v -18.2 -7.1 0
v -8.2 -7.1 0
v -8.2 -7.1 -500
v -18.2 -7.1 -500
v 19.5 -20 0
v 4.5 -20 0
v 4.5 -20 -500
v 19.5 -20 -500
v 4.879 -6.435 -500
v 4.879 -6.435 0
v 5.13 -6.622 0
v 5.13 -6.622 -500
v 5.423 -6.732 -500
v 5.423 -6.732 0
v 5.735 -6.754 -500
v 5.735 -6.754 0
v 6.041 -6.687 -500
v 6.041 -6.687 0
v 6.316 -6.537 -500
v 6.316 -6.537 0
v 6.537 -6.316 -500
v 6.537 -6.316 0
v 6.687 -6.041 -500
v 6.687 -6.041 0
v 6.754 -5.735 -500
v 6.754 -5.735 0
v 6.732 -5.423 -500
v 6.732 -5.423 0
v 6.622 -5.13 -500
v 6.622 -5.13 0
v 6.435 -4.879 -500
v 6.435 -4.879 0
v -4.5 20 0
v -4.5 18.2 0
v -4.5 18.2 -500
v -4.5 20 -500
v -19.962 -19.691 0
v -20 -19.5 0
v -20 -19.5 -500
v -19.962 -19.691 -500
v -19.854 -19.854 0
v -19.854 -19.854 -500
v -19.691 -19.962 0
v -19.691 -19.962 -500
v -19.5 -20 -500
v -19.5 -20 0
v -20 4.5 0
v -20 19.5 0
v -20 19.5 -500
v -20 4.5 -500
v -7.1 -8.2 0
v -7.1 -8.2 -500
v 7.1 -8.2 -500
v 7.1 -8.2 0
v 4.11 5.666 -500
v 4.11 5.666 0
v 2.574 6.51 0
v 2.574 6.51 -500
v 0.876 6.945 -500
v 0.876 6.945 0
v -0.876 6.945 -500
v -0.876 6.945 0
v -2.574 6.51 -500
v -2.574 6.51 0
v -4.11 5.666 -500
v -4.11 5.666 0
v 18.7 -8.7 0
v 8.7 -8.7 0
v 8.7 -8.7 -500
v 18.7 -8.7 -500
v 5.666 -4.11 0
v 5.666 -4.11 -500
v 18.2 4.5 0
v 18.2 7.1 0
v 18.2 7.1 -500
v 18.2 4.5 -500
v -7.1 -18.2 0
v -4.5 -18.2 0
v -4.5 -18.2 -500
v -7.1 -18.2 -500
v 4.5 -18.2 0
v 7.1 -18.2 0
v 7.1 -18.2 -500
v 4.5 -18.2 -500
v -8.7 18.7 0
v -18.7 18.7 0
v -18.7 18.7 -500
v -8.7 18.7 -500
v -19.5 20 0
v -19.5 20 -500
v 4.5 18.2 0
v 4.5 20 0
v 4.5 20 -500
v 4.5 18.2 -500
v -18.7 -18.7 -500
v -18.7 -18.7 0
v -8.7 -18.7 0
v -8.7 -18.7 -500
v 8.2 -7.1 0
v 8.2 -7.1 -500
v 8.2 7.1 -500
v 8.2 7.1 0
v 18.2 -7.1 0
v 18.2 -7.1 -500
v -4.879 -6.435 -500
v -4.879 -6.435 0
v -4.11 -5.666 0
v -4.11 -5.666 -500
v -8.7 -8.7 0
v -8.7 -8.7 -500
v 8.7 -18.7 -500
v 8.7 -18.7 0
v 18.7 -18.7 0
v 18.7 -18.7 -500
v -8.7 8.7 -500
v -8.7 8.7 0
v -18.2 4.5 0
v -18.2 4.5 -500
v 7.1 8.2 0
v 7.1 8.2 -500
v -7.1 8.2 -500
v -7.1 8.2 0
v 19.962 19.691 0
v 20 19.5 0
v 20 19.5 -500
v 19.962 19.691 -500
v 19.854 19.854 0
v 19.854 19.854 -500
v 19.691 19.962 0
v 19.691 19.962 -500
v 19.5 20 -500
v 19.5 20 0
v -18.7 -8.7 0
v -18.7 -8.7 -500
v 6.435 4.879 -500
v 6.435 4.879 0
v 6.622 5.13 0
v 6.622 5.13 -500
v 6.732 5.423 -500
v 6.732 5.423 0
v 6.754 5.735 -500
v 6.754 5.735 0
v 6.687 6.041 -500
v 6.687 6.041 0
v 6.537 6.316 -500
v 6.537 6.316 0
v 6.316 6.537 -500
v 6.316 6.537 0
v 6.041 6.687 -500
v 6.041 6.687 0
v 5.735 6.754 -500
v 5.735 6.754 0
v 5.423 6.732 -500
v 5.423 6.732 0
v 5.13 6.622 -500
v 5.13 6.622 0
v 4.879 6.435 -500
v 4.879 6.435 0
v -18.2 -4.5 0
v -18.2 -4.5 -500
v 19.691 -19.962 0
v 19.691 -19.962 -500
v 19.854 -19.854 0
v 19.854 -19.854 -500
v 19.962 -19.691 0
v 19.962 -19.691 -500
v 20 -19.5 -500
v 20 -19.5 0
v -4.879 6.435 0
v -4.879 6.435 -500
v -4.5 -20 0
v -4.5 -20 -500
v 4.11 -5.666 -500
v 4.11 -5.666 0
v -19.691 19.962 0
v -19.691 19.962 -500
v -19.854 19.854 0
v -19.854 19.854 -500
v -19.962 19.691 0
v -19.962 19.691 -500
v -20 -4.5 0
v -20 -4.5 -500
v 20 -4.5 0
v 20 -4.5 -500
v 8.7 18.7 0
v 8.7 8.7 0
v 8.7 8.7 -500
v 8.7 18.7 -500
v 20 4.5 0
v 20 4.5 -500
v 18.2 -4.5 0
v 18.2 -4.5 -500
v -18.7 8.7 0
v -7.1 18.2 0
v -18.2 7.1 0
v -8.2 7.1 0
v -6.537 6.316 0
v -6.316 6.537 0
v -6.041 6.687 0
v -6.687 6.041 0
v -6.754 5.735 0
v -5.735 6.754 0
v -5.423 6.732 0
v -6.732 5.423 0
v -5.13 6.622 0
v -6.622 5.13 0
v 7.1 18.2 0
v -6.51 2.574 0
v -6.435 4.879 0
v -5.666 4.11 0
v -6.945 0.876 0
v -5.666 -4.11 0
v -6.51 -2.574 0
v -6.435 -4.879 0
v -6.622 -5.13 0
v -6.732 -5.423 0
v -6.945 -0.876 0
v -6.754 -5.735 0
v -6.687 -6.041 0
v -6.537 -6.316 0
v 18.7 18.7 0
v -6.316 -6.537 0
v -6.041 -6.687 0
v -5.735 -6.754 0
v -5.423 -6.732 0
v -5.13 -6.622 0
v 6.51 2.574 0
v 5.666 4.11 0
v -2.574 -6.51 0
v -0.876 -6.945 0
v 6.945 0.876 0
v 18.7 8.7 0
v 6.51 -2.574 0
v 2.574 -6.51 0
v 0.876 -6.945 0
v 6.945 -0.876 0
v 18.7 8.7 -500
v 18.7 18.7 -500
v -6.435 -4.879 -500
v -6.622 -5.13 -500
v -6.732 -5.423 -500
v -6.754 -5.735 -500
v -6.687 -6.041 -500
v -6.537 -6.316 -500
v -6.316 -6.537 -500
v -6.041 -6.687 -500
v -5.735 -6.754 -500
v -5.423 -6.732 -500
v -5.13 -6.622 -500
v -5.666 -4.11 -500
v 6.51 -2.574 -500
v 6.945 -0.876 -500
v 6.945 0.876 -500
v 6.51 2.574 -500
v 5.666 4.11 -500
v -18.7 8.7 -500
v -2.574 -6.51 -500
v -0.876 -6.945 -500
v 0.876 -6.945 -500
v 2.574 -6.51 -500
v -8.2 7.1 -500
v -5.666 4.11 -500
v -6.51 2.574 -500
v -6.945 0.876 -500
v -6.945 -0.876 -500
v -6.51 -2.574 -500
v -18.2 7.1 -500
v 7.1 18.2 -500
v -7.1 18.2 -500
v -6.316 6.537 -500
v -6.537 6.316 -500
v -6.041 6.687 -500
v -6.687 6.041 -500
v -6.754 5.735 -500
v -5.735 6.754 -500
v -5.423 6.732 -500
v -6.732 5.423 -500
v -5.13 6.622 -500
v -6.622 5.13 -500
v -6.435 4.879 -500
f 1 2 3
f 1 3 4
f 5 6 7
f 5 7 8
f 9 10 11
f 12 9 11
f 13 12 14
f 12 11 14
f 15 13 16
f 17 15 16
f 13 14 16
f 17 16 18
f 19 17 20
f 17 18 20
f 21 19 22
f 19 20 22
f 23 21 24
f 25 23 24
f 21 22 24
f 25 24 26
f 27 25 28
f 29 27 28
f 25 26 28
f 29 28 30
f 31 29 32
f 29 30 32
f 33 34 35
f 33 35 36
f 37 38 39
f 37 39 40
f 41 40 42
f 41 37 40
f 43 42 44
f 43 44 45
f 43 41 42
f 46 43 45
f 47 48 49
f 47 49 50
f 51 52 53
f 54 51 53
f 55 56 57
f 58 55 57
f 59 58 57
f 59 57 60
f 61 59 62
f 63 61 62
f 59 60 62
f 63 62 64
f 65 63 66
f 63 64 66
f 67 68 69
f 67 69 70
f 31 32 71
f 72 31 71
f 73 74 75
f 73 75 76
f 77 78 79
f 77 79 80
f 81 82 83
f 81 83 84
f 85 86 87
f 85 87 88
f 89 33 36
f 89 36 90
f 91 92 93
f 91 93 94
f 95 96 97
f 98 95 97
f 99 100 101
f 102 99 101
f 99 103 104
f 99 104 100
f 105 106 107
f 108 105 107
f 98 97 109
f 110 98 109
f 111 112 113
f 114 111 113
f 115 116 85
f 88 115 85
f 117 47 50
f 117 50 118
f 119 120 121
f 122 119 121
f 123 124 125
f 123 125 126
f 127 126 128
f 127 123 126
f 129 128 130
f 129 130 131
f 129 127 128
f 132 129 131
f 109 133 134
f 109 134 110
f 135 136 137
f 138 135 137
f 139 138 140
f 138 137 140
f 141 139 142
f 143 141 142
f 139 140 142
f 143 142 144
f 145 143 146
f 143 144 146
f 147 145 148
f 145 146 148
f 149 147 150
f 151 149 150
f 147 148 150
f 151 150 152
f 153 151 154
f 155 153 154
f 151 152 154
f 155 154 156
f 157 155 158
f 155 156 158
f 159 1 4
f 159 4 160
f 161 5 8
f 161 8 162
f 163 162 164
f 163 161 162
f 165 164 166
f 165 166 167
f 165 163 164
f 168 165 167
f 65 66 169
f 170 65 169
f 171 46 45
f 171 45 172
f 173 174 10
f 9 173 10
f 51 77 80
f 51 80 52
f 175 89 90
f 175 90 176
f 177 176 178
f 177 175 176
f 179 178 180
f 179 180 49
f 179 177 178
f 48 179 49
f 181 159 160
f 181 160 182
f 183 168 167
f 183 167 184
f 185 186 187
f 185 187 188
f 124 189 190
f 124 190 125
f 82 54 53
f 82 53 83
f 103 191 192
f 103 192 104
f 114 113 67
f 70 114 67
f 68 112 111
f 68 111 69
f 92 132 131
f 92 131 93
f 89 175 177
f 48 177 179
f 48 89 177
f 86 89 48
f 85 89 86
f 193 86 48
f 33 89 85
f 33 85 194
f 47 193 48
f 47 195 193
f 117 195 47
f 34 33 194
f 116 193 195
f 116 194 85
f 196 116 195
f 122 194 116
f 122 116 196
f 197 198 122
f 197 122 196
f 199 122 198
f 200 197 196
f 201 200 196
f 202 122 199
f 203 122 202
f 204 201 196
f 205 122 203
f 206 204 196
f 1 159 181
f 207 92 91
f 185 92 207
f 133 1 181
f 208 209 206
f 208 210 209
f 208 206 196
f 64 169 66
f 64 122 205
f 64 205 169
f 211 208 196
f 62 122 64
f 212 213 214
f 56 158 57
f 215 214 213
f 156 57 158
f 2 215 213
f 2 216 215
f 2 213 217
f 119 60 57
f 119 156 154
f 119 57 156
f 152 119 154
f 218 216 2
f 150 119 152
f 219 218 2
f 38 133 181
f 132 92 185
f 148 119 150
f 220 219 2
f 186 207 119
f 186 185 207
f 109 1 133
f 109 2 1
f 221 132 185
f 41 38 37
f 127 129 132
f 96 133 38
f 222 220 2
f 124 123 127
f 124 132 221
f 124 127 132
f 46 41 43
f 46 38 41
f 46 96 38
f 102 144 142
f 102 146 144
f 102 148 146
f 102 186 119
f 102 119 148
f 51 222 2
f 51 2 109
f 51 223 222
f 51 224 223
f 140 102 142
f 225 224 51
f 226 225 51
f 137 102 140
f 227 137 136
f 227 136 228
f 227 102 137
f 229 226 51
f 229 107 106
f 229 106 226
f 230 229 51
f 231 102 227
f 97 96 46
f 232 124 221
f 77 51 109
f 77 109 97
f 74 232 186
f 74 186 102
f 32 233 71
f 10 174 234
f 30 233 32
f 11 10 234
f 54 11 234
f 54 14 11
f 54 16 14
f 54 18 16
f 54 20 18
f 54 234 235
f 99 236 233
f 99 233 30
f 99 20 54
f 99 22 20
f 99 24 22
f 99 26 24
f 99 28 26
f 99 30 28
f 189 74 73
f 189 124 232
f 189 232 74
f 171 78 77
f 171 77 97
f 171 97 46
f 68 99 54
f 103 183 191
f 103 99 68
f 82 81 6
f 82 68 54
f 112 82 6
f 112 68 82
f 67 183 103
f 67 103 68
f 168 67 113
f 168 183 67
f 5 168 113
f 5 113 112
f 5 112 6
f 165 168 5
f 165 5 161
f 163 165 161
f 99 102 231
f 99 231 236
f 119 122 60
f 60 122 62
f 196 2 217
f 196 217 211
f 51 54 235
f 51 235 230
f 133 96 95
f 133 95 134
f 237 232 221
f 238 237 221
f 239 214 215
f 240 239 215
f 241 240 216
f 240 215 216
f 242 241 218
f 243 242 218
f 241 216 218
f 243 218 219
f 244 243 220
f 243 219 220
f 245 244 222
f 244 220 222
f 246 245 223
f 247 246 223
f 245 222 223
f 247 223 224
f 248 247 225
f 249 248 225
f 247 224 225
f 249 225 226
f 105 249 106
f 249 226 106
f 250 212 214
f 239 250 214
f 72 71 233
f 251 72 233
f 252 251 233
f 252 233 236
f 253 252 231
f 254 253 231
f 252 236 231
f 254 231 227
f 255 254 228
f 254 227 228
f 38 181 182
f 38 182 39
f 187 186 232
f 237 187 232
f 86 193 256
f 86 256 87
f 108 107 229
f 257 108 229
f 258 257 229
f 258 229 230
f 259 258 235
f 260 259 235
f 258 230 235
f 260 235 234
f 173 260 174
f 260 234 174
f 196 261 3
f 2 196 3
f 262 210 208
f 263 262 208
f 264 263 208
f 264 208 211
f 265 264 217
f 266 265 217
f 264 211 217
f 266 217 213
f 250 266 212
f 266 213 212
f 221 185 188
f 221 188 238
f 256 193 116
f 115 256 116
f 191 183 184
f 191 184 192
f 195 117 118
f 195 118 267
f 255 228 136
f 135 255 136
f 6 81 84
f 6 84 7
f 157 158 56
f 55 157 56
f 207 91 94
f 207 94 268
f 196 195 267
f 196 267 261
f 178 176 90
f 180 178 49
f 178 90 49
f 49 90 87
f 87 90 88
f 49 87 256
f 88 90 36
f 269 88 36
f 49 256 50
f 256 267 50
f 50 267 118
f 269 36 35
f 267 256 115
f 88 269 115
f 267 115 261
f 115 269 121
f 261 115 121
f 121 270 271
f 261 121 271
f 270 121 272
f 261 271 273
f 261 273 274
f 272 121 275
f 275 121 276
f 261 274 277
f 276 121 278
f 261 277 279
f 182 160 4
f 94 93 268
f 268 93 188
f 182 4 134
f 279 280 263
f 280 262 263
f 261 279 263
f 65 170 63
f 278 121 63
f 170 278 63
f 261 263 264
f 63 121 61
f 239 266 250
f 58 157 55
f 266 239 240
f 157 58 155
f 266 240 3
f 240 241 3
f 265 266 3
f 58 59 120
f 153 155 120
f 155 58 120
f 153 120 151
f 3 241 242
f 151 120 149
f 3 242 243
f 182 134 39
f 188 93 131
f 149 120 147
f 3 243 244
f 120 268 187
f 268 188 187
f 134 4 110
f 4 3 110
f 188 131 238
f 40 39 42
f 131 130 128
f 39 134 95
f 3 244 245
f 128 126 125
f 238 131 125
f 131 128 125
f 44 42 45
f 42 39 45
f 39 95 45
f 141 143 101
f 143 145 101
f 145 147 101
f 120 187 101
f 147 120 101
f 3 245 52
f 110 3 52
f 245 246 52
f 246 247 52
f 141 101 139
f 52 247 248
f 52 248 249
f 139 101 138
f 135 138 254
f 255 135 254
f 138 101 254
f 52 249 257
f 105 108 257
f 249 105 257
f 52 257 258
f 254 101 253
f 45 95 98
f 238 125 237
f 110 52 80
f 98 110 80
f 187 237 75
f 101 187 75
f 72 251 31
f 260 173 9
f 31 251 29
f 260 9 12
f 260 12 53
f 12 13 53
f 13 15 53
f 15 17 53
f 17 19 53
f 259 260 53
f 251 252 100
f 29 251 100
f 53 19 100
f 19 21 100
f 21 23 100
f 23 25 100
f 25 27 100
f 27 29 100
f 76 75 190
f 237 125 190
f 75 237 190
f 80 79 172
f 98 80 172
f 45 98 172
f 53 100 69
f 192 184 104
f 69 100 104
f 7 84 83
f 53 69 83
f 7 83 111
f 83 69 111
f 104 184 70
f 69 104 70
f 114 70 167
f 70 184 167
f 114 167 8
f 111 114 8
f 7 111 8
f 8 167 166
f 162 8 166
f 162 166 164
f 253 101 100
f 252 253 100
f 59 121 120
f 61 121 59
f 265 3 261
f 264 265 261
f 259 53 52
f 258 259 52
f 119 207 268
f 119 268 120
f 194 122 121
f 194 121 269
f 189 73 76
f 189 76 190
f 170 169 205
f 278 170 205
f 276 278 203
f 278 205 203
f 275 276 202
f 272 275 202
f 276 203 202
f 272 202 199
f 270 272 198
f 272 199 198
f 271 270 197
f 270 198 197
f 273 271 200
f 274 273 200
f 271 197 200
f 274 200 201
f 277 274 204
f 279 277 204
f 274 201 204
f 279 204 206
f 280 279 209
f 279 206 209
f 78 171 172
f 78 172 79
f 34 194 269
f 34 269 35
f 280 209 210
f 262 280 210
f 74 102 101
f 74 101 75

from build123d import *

# Parameters (mm, degrees)
SKETCH114_W               = 10
SKETCH114_H               = 10
F_40_X_40A_X_R0_5_1_DEPTH = 500


with BuildPart() as part:
    # Sketch114 → 铝型材 40 X 40A X R0.5(1) (new body)
    with BuildSketch(Plane.YX):
        with BuildLine():
            Line((-19.5, 20), (-4.5, 20))
            Line((-4.5, 20), (-4.5, 18.2))
            Line((-4.5, 18.2), (-7.1, 18.2))
            Line((-7.1, 18.2), (-7.1, 8.2))
            Line((-7.1, 8.2), (7.1, 8.2))
            Line((7.1, 8.2), (7.1, 18.2))
            Line((7.1, 18.2), (4.5, 18.2))
            Line((4.5, 18.2), (4.5, 20))
            Line((4.5, 20), (19.5, 20))
            ThreePointArc((19.5, 20), (19.853553391, 19.853553391), (20, 19.5))
            Line((20, 19.5), (20, 4.5))
            Line((20, 4.5), (18.2, 4.5))
            Line((18.2, 4.5), (18.2, 7.1))
            Line((18.2, 7.1), (8.2, 7.1))
            Line((8.2, 7.1), (8.2, -7.1))
            Line((8.2, -7.1), (18.2, -7.1))
            Line((18.2, -7.1), (18.2, -4.5))
            Line((18.2, -4.5), (20, -4.5))
            Line((20, -4.5), (20, -19.5))
            ThreePointArc((20, -19.5), (19.853553391, -19.853553391), (19.5, -20))
            Line((19.5, -20), (4.5, -20))
            Line((4.5, -20), (4.5, -18.2))
            Line((4.5, -18.2), (7.1, -18.2))
            Line((7.1, -18.2), (7.1, -8.2))
            Line((7.1, -8.2), (-7.1, -8.2))
            Line((-7.1, -8.2), (-7.1, -18.2))
            Line((-7.1, -18.2), (-4.5, -18.2))
            Line((-4.5, -18.2), (-4.5, -20))
            Line((-4.5, -20), (-19.5, -20))
            ThreePointArc((-19.5, -20), (-19.853553391, -19.853553391), (-20, -19.5))
            Line((-20, -19.5), (-20, -4.5))
            Line((-20, -4.5), (-18.2, -4.5))
            Line((-18.2, -4.5), (-18.2, -7.1))
            Line((-18.2, -7.1), (-8.2, -7.1))
            Line((-8.2, -7.1), (-8.2, 7.1))
            Line((-8.2, 7.1), (-18.2, 7.1))
            Line((-18.2, 7.1), (-18.2, 4.5))
            Line((-18.2, 4.5), (-20, 4.5))
            Line((-20, 4.5), (-20, 19.5))
            ThreePointArc((-20, 19.5), (-19.853553391, 19.853553391), (-19.5, 20))
        make_face()
        with BuildLine():
            Line((-4.87903679, 6.434671709), (-4.110433762, 5.66606868))
            ThreePointArc((-4.110433762, 5.66606868), (0, 7), (4.110433762, 5.66606868))
            Line((4.110433762, 5.66606868), (4.87903679, 6.434671709))
            ThreePointArc((4.87903679, 6.434671709), (6.434671709, 6.434671709), (6.434671709, 4.87903679))
            Line((6.434671709, 4.87903679), (5.66606868, 4.110433762))
            ThreePointArc((5.66606868, 4.110433762), (7, 0), (5.66606868, -4.110433762))
            Line((5.66606868, -4.110433762), (6.434671709, -4.87903679))
            ThreePointArc((6.434671709, -4.87903679), (6.434671709, -6.434671709), (4.87903679, -6.434671709))
            Line((4.87903679, -6.434671709), (4.110433762, -5.66606868))
            ThreePointArc((4.110433762, -5.66606868), (0, -7), (-4.110433762, -5.66606868))
            Line((-4.110433762, -5.66606868), (-4.87903679, -6.434671709))
            ThreePointArc((-4.87903679, -6.434671709), (-6.434671709, -6.434671709), (-6.434671709, -4.87903679))
            Line((-6.434671709, -4.87903679), (-5.66606868, -4.110433762))
            ThreePointArc((-5.66606868, -4.110433762), (-7, 0), (-5.66606868, 4.110433762))
            Line((-5.66606868, 4.110433762), (-6.434671709, 4.87903679))
            ThreePointArc((-6.434671709, 4.87903679), (-6.434671709, 6.434671709), (-4.87903679, 6.434671709))
        make_face(mode=Mode.SUBTRACT)
        with Locations((-13.7, 13.7)):
            Rectangle(SKETCH114_W, SKETCH114_H, mode=Mode.SUBTRACT)
        with Locations((13.7, 13.7)):
            Rectangle(SKETCH114_W, SKETCH114_H, mode=Mode.SUBTRACT)
        with Locations((13.7, -13.7)):
            Rectangle(SKETCH114_W, SKETCH114_H, mode=Mode.SUBTRACT)
        with Locations((-13.7, -13.7)):
            Rectangle(SKETCH114_W, SKETCH114_H, mode=Mode.SUBTRACT)
    extrude(amount=F_40_X_40A_X_R0_5_1_DEPTH)


solid = part.part
